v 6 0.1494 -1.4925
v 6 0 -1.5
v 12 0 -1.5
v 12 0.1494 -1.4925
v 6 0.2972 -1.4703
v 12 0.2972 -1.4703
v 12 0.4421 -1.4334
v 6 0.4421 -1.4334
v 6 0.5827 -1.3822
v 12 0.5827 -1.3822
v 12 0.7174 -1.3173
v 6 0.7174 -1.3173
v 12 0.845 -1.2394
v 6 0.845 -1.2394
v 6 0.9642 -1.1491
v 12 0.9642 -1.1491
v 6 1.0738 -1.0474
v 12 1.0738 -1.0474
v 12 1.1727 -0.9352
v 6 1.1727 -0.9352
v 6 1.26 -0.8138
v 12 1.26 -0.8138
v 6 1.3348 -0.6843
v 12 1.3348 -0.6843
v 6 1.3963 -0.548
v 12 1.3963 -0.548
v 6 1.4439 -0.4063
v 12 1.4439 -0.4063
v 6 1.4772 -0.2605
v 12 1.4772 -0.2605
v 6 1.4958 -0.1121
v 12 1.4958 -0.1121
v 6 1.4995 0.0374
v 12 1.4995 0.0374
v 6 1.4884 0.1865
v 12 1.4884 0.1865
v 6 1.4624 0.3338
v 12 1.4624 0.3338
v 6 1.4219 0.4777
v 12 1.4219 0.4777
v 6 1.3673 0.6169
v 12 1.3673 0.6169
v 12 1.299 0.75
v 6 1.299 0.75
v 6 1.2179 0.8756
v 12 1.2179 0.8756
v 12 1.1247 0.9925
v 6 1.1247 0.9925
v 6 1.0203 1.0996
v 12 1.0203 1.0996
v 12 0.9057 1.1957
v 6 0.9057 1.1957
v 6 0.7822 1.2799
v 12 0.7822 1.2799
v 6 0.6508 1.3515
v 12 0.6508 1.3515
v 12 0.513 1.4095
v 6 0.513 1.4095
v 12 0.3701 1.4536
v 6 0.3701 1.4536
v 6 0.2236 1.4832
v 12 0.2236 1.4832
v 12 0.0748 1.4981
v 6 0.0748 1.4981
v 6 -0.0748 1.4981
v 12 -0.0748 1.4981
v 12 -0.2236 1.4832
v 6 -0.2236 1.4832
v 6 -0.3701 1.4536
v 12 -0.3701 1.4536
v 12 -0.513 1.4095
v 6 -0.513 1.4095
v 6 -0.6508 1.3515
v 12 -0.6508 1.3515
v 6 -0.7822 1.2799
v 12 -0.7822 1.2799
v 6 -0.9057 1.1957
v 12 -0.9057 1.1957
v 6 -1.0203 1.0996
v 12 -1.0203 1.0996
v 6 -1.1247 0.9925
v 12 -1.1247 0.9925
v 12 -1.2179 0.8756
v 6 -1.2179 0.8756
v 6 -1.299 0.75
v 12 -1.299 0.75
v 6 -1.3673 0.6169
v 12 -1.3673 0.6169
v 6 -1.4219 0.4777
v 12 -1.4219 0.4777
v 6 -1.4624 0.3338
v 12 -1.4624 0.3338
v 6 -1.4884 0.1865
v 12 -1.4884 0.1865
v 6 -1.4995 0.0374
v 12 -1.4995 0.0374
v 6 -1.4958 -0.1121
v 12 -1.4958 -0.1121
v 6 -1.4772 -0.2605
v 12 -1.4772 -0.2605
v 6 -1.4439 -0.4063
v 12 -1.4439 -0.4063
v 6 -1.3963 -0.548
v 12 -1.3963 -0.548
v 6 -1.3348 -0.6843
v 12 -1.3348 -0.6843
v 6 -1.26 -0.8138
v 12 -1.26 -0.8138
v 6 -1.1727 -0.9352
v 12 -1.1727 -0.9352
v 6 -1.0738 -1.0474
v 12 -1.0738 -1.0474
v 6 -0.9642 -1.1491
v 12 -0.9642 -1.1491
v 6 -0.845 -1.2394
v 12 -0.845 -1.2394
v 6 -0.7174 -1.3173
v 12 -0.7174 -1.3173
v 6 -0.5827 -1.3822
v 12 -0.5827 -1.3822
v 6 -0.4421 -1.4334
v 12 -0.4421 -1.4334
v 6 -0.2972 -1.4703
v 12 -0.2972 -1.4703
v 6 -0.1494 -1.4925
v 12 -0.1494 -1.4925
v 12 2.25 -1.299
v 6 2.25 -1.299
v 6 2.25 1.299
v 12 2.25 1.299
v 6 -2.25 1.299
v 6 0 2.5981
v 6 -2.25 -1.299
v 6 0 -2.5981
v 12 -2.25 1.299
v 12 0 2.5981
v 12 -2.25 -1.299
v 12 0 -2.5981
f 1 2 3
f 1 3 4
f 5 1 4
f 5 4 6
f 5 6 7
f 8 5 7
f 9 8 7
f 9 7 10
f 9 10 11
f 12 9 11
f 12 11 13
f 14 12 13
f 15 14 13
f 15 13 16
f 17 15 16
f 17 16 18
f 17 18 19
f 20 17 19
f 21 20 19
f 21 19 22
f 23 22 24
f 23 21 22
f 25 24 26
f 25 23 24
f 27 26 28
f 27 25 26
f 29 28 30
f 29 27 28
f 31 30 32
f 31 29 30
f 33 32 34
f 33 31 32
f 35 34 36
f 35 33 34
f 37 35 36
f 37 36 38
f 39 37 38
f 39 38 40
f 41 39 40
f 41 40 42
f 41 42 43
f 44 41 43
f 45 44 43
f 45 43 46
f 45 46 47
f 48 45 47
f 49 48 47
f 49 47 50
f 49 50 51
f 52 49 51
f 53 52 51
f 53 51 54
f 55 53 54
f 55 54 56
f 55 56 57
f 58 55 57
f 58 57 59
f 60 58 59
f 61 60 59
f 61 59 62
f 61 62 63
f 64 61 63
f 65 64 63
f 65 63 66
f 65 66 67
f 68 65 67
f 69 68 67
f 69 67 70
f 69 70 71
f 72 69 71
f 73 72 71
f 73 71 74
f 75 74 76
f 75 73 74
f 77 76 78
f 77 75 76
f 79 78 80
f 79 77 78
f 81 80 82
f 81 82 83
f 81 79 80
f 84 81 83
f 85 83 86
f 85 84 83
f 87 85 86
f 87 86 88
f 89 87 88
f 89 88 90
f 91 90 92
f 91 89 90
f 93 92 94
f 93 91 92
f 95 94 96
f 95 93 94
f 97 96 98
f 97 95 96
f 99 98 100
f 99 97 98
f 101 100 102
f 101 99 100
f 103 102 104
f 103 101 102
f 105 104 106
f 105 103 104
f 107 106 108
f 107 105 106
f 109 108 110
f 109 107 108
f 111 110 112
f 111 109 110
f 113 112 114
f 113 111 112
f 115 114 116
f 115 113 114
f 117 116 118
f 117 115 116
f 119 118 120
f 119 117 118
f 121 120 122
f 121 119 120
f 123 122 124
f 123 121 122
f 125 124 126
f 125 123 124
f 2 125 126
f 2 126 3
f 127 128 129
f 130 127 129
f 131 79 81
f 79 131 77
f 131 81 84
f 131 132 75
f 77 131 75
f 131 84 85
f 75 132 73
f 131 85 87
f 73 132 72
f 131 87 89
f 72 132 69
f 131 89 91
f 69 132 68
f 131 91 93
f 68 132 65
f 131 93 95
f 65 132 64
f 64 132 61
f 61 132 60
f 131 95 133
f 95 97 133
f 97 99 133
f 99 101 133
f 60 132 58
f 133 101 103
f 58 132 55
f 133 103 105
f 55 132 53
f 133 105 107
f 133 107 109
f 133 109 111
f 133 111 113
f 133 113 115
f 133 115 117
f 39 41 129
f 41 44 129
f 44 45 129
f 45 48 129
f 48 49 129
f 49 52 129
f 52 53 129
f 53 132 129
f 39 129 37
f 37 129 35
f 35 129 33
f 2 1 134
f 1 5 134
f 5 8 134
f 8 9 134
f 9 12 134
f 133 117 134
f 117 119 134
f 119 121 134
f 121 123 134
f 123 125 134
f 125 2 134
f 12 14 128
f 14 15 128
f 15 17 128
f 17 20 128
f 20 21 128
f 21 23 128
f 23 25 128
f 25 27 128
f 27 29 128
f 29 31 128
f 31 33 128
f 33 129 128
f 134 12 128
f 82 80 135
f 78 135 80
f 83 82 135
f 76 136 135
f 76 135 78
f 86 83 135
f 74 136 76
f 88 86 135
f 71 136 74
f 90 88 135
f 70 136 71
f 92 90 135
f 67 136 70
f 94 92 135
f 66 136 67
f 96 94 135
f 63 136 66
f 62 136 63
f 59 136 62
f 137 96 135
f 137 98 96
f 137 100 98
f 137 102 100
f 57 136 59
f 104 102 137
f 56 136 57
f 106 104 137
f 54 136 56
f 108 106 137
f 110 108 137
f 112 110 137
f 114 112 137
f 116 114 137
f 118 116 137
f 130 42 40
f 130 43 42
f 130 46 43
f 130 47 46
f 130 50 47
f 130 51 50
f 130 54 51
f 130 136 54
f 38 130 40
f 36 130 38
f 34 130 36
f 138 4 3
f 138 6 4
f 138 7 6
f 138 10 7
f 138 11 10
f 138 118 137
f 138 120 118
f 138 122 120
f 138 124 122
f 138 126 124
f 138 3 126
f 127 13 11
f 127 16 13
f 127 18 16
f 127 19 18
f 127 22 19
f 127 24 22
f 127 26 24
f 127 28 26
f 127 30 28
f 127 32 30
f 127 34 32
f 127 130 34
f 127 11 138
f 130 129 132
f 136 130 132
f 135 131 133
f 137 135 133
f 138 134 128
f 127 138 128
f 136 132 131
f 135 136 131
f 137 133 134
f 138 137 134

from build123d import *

# Parameters (mm, degrees)
SKETCH_1_R          = 1.5
EXTRUDE_1_DEPTH     = 6
EXTRUDE_2_DEPTH     = 6
CUT_EXTRUDE_START   = -7
SKETCH_4_R          = 1.5
CUT_EXTRUDE_1_DEPTH = 7
SKETCH_5_R          = 2.902740869
CUT_EXTRUDE_2_DEPTH = 6


with BuildPart() as part:
    # 草图1 → 凸台-拉伸1 (new body)
    with BuildSketch(Plane(origin=(0, 0, 0), x_dir=(0, 0, -1), z_dir=(1, 0, 0))):
        Circle(SKETCH_1_R)
    extrude(amount=EXTRUDE_1_DEPTH)

    # 草图2 → 凸台-拉伸2 (add)
    with BuildSketch(Plane(origin=(6, 0, 0), x_dir=(0, 0, -1), z_dir=(1, 0, 0))):
        Polygon((2.598076211, 0), (1.299038106, 2.25), (-1.299038106, 2.25), (-2.598076211, 0), (-1.299038106, -2.25), (1.299038106, -2.25), align=None)
    extrude(amount=EXTRUDE_2_DEPTH)

    # 草图4 → 切除-拉伸1 (cut)
    with BuildSketch(Plane(origin=(12, 0, 0), x_dir=(0, 0, -1), z_dir=(1, 0, 0)).offset(CUT_EXTRUDE_START)):
        Circle(SKETCH_4_R)
    extrude(amount=CUT_EXTRUDE_1_DEPTH, mode=Mode.SUBTRACT)


with BuildPart() as cut_extrude_1_piece_1:
    # of the separate pieces the step leaves, piece 1, a body of its own (cut_extrude_1_pieces)
    add(part.part.solids().sort_by_distance((6, 0, -2.598076211))[0])


with BuildPart() as cut_extrude_1_piece_2:
    # of the separate pieces the step leaves, piece 2, a body of its own (cut_extrude_1_pieces)
    add(part.part.solids().sort_by_distance((0, 0, -1.5))[0])

    # 草图5 → 切除-拉伸2 (cut)
    with BuildSketch(Plane.ZY):
        Circle(SKETCH_5_R)
    extrude(amount=-CUT_EXTRUDE_2_DEPTH, mode=Mode.SUBTRACT)


solid = cut_extrude_1_piece_1.part
